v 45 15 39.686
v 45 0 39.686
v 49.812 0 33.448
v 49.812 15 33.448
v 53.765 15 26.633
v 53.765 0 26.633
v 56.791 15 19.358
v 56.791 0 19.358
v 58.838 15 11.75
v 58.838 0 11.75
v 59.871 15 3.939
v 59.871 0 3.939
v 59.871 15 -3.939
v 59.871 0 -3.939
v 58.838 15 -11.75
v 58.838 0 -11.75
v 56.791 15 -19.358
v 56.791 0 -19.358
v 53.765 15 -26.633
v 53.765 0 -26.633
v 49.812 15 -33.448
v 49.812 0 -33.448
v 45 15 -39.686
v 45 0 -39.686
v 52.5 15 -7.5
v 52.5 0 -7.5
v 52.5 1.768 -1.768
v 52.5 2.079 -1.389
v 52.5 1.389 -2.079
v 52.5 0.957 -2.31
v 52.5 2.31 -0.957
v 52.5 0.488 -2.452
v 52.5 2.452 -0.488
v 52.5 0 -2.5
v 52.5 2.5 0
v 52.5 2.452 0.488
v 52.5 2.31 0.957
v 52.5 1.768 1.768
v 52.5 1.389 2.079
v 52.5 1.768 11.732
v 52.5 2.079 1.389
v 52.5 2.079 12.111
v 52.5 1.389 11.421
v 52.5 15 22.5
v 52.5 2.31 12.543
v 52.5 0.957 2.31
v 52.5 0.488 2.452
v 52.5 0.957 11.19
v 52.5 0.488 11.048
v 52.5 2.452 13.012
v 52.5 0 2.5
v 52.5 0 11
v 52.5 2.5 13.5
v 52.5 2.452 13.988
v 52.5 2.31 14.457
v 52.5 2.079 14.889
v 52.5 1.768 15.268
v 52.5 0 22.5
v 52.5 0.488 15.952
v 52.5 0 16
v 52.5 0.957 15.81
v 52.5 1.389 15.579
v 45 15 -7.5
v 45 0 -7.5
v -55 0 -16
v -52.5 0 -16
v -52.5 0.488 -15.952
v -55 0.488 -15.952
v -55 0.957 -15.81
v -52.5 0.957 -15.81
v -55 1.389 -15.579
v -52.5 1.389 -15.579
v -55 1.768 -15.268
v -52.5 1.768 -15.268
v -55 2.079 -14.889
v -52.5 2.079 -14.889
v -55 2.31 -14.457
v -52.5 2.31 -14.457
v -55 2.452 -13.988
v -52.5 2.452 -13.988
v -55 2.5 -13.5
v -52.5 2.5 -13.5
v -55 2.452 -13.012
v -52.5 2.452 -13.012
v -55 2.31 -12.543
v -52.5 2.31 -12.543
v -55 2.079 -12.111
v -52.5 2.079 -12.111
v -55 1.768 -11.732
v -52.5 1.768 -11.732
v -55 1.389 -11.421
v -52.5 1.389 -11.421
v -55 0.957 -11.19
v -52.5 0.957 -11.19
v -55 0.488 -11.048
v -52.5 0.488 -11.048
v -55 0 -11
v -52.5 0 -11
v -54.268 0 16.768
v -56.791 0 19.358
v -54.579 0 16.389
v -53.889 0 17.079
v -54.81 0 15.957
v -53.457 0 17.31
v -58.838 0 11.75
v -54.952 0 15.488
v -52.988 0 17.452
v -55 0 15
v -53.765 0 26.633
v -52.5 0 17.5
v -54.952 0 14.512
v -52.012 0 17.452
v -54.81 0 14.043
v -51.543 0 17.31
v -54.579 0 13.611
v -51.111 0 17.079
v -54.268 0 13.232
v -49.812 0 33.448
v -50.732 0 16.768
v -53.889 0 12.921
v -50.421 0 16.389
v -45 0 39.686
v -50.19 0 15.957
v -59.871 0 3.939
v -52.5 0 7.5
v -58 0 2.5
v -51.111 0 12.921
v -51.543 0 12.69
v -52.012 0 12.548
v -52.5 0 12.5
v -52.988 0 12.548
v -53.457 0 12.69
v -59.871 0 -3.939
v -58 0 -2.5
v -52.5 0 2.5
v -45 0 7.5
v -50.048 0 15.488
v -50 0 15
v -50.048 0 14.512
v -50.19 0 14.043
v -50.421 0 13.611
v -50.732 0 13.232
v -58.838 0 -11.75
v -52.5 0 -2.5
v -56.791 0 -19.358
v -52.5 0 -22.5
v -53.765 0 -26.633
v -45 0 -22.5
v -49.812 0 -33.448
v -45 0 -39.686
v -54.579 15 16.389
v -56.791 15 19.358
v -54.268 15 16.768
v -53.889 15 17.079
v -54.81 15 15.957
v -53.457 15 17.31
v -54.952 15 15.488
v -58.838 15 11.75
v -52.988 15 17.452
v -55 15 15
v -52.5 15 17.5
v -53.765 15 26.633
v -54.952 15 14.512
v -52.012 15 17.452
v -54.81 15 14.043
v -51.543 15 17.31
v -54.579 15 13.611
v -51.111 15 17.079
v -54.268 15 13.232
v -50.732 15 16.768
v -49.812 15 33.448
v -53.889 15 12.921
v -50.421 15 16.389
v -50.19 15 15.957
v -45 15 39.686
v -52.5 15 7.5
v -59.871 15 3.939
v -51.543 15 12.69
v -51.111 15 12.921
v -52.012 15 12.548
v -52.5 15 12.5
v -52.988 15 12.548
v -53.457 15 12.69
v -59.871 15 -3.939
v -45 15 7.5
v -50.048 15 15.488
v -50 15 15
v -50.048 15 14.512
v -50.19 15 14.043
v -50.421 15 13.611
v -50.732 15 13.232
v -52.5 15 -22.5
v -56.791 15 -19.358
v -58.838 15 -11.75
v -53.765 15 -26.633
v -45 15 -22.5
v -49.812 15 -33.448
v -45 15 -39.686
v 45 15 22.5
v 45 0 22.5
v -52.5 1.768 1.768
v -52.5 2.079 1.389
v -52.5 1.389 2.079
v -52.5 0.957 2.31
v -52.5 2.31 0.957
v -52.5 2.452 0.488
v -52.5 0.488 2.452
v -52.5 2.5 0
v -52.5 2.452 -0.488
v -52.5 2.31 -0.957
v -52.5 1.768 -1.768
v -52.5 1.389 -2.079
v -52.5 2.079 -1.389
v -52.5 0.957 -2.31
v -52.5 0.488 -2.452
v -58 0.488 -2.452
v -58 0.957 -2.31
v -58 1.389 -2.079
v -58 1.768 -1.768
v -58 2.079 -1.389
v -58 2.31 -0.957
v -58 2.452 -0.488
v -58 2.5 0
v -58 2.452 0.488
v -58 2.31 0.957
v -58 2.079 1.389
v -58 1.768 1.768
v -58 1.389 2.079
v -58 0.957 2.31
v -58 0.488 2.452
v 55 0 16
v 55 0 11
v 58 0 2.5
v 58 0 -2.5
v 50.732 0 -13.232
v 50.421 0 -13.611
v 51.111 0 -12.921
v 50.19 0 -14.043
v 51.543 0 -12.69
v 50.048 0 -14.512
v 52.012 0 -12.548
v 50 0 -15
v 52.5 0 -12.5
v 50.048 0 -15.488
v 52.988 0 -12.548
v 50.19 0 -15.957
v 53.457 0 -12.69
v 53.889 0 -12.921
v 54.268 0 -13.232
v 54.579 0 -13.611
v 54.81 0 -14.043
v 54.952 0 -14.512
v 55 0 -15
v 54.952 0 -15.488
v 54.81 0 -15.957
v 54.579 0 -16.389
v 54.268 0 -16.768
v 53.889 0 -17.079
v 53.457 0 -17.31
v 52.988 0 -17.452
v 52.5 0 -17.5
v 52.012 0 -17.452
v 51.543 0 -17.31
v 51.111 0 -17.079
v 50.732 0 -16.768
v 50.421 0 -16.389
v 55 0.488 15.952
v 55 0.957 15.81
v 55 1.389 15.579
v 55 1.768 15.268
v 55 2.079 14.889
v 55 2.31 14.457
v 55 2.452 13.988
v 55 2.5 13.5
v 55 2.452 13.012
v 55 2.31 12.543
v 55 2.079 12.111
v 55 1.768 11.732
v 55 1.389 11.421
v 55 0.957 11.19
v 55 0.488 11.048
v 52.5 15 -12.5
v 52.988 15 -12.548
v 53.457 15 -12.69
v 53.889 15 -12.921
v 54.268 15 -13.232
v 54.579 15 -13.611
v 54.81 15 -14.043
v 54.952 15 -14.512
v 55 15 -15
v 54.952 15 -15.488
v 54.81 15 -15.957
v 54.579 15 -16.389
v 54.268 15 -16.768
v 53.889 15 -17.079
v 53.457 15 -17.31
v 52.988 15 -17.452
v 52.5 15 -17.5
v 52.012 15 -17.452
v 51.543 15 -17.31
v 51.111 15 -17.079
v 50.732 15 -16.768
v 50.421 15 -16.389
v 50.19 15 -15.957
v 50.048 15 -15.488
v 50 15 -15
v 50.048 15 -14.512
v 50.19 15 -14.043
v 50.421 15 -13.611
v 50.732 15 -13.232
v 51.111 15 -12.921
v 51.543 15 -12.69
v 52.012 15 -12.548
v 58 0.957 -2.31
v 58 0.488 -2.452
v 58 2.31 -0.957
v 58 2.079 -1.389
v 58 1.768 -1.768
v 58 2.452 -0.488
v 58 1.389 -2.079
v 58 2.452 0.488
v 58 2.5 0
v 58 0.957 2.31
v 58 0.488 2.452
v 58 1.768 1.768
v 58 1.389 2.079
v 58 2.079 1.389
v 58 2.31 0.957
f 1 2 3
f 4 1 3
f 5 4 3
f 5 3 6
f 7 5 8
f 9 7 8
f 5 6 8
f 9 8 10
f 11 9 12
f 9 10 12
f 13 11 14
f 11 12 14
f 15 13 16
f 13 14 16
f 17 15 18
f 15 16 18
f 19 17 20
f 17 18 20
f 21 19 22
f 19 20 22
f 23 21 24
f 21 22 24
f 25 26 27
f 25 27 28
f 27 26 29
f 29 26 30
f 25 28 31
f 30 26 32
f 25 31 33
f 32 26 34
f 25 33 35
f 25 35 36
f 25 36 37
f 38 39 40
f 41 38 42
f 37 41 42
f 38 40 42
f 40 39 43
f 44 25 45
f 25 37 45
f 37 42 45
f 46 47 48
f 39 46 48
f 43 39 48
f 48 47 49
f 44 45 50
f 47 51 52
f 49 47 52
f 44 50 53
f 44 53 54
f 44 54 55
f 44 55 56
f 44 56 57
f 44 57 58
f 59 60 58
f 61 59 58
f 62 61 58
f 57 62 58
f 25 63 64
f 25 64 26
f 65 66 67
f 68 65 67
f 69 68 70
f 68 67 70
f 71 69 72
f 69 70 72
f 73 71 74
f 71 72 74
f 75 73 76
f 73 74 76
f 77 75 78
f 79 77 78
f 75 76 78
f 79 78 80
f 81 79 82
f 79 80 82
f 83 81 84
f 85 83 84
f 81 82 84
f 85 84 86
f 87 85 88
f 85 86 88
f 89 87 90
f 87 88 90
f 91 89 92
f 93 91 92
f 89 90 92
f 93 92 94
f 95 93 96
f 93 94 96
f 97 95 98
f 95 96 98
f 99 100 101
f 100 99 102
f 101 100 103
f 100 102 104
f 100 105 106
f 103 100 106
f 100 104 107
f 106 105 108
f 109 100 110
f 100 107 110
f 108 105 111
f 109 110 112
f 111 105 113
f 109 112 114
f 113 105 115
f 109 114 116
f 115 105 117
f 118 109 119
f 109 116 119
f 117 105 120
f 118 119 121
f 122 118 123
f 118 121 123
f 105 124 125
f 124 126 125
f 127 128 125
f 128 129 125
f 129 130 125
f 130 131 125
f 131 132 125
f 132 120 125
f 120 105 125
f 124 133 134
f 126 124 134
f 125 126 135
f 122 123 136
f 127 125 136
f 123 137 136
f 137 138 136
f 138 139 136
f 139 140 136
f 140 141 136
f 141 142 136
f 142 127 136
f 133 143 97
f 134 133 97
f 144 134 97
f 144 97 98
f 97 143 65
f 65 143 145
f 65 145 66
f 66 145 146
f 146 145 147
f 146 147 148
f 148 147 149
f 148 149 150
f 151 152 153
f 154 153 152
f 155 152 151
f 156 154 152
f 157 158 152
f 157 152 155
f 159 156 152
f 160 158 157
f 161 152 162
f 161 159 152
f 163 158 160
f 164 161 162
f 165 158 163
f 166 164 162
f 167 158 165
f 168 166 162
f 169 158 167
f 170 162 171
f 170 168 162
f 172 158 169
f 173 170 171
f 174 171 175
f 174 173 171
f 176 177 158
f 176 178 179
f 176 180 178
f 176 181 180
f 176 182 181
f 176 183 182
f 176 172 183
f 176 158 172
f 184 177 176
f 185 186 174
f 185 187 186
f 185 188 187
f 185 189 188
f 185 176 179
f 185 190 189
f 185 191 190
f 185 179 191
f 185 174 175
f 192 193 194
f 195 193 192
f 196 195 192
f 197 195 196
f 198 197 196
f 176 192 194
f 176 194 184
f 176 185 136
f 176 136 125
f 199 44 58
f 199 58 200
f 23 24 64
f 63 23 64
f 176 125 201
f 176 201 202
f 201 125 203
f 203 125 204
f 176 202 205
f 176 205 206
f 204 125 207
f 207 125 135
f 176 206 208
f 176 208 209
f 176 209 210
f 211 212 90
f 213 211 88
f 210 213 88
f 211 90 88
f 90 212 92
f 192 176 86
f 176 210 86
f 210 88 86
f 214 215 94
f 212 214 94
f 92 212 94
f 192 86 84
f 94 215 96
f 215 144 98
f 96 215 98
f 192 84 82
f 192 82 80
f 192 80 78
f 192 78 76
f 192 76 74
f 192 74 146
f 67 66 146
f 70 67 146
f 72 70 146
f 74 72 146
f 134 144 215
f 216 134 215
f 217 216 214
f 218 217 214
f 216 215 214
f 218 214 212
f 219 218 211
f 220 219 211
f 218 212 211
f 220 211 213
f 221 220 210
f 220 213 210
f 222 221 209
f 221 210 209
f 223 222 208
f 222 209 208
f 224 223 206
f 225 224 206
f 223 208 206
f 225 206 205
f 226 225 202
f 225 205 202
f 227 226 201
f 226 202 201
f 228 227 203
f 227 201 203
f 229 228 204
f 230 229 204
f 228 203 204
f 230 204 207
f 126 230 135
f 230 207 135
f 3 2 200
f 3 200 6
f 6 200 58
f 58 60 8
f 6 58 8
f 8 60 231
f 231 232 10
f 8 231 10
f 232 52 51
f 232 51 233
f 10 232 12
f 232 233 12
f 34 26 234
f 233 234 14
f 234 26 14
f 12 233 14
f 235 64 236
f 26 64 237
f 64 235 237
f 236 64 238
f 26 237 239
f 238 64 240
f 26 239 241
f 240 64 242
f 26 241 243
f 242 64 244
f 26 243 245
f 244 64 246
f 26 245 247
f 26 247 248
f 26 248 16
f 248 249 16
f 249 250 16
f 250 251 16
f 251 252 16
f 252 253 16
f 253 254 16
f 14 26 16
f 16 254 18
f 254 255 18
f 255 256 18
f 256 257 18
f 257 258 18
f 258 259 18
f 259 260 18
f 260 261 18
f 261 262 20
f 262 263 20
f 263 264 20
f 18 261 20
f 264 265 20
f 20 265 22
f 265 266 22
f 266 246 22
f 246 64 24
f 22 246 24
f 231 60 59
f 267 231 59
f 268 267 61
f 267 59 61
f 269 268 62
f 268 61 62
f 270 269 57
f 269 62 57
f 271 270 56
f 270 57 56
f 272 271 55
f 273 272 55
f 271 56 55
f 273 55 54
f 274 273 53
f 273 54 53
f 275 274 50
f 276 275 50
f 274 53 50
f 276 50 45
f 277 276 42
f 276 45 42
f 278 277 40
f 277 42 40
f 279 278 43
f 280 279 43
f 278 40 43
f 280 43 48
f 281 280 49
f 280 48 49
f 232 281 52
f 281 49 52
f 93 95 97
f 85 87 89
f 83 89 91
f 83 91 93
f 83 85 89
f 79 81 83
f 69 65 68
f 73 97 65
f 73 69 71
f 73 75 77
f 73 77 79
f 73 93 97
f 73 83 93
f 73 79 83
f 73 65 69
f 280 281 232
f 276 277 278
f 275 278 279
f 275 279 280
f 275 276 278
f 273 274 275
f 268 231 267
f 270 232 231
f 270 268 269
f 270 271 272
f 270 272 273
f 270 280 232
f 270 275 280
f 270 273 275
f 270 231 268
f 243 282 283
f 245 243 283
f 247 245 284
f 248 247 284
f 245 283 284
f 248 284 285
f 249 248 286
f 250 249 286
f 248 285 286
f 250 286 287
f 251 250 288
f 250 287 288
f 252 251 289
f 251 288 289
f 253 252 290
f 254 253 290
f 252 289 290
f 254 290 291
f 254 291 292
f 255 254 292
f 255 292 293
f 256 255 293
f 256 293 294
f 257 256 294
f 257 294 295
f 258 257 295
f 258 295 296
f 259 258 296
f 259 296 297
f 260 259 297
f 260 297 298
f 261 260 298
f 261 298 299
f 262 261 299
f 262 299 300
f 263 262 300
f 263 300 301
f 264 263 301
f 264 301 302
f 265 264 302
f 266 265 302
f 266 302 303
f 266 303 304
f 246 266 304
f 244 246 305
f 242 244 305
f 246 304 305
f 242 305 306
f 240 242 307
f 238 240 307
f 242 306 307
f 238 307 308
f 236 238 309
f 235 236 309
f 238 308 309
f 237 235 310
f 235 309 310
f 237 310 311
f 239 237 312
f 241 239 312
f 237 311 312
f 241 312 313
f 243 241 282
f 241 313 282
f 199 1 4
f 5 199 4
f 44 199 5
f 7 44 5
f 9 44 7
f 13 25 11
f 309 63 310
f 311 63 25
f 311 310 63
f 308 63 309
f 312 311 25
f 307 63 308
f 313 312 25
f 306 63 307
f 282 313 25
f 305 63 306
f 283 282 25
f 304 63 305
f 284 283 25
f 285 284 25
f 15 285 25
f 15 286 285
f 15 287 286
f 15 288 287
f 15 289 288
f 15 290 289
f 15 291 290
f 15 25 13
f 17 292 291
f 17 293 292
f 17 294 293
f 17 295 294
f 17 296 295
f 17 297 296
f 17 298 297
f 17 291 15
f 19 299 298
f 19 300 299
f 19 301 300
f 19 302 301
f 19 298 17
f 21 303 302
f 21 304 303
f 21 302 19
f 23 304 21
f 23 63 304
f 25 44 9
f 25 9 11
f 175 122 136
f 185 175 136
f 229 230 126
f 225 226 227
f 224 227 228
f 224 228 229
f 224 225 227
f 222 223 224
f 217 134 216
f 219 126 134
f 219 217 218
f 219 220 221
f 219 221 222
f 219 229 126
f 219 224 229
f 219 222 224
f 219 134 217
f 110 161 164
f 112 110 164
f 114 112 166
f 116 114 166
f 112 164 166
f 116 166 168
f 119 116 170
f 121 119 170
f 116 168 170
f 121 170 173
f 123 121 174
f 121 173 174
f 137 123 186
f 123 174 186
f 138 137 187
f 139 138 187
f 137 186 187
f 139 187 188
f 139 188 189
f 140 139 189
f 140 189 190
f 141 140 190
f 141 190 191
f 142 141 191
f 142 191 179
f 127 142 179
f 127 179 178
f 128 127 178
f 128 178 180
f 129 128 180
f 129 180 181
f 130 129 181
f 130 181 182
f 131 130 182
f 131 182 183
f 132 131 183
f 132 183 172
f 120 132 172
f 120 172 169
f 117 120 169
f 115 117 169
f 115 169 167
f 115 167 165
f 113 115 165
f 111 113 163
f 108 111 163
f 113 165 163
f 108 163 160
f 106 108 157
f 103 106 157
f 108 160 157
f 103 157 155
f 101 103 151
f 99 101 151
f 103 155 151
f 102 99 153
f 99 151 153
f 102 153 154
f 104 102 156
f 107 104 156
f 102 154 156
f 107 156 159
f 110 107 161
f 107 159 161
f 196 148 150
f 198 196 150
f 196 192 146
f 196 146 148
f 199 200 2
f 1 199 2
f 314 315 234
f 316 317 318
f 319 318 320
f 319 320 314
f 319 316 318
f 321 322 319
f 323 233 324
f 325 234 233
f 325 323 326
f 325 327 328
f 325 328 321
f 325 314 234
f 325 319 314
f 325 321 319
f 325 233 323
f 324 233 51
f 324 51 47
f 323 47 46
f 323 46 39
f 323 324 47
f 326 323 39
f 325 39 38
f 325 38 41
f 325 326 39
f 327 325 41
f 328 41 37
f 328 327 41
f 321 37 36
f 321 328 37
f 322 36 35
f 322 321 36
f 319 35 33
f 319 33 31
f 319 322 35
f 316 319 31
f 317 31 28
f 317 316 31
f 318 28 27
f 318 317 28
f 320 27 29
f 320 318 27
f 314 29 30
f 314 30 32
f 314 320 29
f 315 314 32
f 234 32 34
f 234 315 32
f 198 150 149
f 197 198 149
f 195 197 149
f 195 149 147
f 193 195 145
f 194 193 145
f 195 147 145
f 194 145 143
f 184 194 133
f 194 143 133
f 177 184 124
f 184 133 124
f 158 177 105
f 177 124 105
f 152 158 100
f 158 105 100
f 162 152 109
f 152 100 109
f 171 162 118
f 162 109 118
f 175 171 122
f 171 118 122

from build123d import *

# Parameters (mm, degrees)
BOSS_EXTRUDE1_DEPTH   = 15
BOSS_EXTRUDE1_2_DEPTH = 15
SKETCH3_R             = 2.5
CUT_EXTRUDE3_DEPTH    = 2.5
SKETCH3_3_R           = 2.5
CUT_EXTRUDE4_DEPTH    = 5.5
CUT_EXTRUDE5_START    = -5.5
SKETCH2_R             = 2.5
CUT_EXTRUDE5_DEPTH    = 5.5
SKETCH2_3_R           = 2.5
CUT_EXTRUDE6_DEPTH    = 2.5
SKETCH4_R             = 2.5
CUT_EXTRUDE7_DEPTH    = 74.484692283


with BuildPart() as part:
    # Sketch1 → Boss-Extrude1 (new body)
    with BuildSketch(Plane(origin=(0, 0, 0), x_dir=(1, 0, 0), z_dir=(0, 1, 0))):
        with BuildLine():
            Line((-45, 22.5), (-45, 39.686269666))
            ThreePointArc((-45, 39.686269666), (-60, 0), (-45, -39.686269666))
            Line((-45, -39.686269666), (-45, -7.5))
            Line((-45, -7.5), (-52.5, -7.5))
            Line((-52.5, -7.5), (-52.5, 7.5))
            Line((-52.5, 7.5), (-52.5, 22.5))
            Line((-52.5, 22.5), (-45, 22.5))
        make_face()
    extrude(amount=BOSS_EXTRUDE1_DEPTH)

    # Sketch3 → Cut-Extrude3 (cut)
    with BuildSketch(Plane(origin=(-52.5, 0, 0), x_dir=(0, 0, -1), z_dir=(1, 0, 0))):
        with Locations((13.5, 0)):
            Circle(SKETCH3_R)
    extrude(amount=-CUT_EXTRUDE3_DEPTH, mode=Mode.SUBTRACT)

    # Sketch3<3> → Cut-Extrude4 (cut)
    with BuildSketch(Plane(origin=(-52.5, 0, 0), x_dir=(0, 0, -1), z_dir=(1, 0, 0))):
        Circle(SKETCH3_3_R)
    extrude(amount=-CUT_EXTRUDE4_DEPTH, mode=Mode.SUBTRACT)


with BuildPart() as body_2:
    # Sketch1 → Boss-Extrude1 2 (new body)
    with BuildSketch(Plane(origin=(0, 0, 0), x_dir=(1, 0, 0), z_dir=(0, 1, 0))):
        with BuildLine():
            Line((45, 7.5), (52.5, 7.5))
            Line((52.5, 7.5), (52.5, -7.5))
            Line((52.5, -7.5), (52.5, -22.5))
            Line((52.5, -22.5), (45, -22.5))
            Line((45, -22.5), (45, -39.686269666))
            ThreePointArc((45, -39.686269666), (60, 0), (45, 39.686269666))
            Line((45, 39.686269666), (45, 7.5))
        make_face()
    extrude(amount=BOSS_EXTRUDE1_2_DEPTH)

    # Sketch2 → Cut-Extrude5 (cut)
    with BuildSketch(Plane.ZY.offset(-52.5).offset(CUT_EXTRUDE5_START)):
        Circle(SKETCH2_R)
    extrude(amount=CUT_EXTRUDE5_DEPTH, mode=Mode.SUBTRACT)

    # Sketch2<3> → Cut-Extrude6 (cut)
    with BuildSketch(Plane.ZY.offset(-52.5)):
        with Locations((13.5, 0)):
            Circle(SKETCH2_3_R)
    extrude(amount=-CUT_EXTRUDE6_DEPTH, mode=Mode.SUBTRACT)


with BuildPart() as cut_extrude7_tool:
    # Sketch4 → Cut-Extrude7 (new, through all)
    with BuildSketch(Plane(origin=(0, 15, 0), x_dir=(1, 0, 0), z_dir=(0, 1, 0))):
        with Locations((52.5, 15)):
            Circle(SKETCH4_R)
        with Locations((-52.5, -15)):
            Circle(SKETCH4_R)
    extrude(amount=-CUT_EXTRUDE7_DEPTH)


with BuildPart() as part_1:
    add(part.part)

    # Cut-Extrude7: cut by cut_extrude7_tool
    add(cut_extrude7_tool.part, mode=Mode.SUBTRACT)


with BuildPart() as body_2_1:
    add(body_2.part)

    # Cut-Extrude7: cut by cut_extrude7_tool
    add(cut_extrude7_tool.part, mode=Mode.SUBTRACT)


solid = Compound([part_1.part, body_2_1.part])
